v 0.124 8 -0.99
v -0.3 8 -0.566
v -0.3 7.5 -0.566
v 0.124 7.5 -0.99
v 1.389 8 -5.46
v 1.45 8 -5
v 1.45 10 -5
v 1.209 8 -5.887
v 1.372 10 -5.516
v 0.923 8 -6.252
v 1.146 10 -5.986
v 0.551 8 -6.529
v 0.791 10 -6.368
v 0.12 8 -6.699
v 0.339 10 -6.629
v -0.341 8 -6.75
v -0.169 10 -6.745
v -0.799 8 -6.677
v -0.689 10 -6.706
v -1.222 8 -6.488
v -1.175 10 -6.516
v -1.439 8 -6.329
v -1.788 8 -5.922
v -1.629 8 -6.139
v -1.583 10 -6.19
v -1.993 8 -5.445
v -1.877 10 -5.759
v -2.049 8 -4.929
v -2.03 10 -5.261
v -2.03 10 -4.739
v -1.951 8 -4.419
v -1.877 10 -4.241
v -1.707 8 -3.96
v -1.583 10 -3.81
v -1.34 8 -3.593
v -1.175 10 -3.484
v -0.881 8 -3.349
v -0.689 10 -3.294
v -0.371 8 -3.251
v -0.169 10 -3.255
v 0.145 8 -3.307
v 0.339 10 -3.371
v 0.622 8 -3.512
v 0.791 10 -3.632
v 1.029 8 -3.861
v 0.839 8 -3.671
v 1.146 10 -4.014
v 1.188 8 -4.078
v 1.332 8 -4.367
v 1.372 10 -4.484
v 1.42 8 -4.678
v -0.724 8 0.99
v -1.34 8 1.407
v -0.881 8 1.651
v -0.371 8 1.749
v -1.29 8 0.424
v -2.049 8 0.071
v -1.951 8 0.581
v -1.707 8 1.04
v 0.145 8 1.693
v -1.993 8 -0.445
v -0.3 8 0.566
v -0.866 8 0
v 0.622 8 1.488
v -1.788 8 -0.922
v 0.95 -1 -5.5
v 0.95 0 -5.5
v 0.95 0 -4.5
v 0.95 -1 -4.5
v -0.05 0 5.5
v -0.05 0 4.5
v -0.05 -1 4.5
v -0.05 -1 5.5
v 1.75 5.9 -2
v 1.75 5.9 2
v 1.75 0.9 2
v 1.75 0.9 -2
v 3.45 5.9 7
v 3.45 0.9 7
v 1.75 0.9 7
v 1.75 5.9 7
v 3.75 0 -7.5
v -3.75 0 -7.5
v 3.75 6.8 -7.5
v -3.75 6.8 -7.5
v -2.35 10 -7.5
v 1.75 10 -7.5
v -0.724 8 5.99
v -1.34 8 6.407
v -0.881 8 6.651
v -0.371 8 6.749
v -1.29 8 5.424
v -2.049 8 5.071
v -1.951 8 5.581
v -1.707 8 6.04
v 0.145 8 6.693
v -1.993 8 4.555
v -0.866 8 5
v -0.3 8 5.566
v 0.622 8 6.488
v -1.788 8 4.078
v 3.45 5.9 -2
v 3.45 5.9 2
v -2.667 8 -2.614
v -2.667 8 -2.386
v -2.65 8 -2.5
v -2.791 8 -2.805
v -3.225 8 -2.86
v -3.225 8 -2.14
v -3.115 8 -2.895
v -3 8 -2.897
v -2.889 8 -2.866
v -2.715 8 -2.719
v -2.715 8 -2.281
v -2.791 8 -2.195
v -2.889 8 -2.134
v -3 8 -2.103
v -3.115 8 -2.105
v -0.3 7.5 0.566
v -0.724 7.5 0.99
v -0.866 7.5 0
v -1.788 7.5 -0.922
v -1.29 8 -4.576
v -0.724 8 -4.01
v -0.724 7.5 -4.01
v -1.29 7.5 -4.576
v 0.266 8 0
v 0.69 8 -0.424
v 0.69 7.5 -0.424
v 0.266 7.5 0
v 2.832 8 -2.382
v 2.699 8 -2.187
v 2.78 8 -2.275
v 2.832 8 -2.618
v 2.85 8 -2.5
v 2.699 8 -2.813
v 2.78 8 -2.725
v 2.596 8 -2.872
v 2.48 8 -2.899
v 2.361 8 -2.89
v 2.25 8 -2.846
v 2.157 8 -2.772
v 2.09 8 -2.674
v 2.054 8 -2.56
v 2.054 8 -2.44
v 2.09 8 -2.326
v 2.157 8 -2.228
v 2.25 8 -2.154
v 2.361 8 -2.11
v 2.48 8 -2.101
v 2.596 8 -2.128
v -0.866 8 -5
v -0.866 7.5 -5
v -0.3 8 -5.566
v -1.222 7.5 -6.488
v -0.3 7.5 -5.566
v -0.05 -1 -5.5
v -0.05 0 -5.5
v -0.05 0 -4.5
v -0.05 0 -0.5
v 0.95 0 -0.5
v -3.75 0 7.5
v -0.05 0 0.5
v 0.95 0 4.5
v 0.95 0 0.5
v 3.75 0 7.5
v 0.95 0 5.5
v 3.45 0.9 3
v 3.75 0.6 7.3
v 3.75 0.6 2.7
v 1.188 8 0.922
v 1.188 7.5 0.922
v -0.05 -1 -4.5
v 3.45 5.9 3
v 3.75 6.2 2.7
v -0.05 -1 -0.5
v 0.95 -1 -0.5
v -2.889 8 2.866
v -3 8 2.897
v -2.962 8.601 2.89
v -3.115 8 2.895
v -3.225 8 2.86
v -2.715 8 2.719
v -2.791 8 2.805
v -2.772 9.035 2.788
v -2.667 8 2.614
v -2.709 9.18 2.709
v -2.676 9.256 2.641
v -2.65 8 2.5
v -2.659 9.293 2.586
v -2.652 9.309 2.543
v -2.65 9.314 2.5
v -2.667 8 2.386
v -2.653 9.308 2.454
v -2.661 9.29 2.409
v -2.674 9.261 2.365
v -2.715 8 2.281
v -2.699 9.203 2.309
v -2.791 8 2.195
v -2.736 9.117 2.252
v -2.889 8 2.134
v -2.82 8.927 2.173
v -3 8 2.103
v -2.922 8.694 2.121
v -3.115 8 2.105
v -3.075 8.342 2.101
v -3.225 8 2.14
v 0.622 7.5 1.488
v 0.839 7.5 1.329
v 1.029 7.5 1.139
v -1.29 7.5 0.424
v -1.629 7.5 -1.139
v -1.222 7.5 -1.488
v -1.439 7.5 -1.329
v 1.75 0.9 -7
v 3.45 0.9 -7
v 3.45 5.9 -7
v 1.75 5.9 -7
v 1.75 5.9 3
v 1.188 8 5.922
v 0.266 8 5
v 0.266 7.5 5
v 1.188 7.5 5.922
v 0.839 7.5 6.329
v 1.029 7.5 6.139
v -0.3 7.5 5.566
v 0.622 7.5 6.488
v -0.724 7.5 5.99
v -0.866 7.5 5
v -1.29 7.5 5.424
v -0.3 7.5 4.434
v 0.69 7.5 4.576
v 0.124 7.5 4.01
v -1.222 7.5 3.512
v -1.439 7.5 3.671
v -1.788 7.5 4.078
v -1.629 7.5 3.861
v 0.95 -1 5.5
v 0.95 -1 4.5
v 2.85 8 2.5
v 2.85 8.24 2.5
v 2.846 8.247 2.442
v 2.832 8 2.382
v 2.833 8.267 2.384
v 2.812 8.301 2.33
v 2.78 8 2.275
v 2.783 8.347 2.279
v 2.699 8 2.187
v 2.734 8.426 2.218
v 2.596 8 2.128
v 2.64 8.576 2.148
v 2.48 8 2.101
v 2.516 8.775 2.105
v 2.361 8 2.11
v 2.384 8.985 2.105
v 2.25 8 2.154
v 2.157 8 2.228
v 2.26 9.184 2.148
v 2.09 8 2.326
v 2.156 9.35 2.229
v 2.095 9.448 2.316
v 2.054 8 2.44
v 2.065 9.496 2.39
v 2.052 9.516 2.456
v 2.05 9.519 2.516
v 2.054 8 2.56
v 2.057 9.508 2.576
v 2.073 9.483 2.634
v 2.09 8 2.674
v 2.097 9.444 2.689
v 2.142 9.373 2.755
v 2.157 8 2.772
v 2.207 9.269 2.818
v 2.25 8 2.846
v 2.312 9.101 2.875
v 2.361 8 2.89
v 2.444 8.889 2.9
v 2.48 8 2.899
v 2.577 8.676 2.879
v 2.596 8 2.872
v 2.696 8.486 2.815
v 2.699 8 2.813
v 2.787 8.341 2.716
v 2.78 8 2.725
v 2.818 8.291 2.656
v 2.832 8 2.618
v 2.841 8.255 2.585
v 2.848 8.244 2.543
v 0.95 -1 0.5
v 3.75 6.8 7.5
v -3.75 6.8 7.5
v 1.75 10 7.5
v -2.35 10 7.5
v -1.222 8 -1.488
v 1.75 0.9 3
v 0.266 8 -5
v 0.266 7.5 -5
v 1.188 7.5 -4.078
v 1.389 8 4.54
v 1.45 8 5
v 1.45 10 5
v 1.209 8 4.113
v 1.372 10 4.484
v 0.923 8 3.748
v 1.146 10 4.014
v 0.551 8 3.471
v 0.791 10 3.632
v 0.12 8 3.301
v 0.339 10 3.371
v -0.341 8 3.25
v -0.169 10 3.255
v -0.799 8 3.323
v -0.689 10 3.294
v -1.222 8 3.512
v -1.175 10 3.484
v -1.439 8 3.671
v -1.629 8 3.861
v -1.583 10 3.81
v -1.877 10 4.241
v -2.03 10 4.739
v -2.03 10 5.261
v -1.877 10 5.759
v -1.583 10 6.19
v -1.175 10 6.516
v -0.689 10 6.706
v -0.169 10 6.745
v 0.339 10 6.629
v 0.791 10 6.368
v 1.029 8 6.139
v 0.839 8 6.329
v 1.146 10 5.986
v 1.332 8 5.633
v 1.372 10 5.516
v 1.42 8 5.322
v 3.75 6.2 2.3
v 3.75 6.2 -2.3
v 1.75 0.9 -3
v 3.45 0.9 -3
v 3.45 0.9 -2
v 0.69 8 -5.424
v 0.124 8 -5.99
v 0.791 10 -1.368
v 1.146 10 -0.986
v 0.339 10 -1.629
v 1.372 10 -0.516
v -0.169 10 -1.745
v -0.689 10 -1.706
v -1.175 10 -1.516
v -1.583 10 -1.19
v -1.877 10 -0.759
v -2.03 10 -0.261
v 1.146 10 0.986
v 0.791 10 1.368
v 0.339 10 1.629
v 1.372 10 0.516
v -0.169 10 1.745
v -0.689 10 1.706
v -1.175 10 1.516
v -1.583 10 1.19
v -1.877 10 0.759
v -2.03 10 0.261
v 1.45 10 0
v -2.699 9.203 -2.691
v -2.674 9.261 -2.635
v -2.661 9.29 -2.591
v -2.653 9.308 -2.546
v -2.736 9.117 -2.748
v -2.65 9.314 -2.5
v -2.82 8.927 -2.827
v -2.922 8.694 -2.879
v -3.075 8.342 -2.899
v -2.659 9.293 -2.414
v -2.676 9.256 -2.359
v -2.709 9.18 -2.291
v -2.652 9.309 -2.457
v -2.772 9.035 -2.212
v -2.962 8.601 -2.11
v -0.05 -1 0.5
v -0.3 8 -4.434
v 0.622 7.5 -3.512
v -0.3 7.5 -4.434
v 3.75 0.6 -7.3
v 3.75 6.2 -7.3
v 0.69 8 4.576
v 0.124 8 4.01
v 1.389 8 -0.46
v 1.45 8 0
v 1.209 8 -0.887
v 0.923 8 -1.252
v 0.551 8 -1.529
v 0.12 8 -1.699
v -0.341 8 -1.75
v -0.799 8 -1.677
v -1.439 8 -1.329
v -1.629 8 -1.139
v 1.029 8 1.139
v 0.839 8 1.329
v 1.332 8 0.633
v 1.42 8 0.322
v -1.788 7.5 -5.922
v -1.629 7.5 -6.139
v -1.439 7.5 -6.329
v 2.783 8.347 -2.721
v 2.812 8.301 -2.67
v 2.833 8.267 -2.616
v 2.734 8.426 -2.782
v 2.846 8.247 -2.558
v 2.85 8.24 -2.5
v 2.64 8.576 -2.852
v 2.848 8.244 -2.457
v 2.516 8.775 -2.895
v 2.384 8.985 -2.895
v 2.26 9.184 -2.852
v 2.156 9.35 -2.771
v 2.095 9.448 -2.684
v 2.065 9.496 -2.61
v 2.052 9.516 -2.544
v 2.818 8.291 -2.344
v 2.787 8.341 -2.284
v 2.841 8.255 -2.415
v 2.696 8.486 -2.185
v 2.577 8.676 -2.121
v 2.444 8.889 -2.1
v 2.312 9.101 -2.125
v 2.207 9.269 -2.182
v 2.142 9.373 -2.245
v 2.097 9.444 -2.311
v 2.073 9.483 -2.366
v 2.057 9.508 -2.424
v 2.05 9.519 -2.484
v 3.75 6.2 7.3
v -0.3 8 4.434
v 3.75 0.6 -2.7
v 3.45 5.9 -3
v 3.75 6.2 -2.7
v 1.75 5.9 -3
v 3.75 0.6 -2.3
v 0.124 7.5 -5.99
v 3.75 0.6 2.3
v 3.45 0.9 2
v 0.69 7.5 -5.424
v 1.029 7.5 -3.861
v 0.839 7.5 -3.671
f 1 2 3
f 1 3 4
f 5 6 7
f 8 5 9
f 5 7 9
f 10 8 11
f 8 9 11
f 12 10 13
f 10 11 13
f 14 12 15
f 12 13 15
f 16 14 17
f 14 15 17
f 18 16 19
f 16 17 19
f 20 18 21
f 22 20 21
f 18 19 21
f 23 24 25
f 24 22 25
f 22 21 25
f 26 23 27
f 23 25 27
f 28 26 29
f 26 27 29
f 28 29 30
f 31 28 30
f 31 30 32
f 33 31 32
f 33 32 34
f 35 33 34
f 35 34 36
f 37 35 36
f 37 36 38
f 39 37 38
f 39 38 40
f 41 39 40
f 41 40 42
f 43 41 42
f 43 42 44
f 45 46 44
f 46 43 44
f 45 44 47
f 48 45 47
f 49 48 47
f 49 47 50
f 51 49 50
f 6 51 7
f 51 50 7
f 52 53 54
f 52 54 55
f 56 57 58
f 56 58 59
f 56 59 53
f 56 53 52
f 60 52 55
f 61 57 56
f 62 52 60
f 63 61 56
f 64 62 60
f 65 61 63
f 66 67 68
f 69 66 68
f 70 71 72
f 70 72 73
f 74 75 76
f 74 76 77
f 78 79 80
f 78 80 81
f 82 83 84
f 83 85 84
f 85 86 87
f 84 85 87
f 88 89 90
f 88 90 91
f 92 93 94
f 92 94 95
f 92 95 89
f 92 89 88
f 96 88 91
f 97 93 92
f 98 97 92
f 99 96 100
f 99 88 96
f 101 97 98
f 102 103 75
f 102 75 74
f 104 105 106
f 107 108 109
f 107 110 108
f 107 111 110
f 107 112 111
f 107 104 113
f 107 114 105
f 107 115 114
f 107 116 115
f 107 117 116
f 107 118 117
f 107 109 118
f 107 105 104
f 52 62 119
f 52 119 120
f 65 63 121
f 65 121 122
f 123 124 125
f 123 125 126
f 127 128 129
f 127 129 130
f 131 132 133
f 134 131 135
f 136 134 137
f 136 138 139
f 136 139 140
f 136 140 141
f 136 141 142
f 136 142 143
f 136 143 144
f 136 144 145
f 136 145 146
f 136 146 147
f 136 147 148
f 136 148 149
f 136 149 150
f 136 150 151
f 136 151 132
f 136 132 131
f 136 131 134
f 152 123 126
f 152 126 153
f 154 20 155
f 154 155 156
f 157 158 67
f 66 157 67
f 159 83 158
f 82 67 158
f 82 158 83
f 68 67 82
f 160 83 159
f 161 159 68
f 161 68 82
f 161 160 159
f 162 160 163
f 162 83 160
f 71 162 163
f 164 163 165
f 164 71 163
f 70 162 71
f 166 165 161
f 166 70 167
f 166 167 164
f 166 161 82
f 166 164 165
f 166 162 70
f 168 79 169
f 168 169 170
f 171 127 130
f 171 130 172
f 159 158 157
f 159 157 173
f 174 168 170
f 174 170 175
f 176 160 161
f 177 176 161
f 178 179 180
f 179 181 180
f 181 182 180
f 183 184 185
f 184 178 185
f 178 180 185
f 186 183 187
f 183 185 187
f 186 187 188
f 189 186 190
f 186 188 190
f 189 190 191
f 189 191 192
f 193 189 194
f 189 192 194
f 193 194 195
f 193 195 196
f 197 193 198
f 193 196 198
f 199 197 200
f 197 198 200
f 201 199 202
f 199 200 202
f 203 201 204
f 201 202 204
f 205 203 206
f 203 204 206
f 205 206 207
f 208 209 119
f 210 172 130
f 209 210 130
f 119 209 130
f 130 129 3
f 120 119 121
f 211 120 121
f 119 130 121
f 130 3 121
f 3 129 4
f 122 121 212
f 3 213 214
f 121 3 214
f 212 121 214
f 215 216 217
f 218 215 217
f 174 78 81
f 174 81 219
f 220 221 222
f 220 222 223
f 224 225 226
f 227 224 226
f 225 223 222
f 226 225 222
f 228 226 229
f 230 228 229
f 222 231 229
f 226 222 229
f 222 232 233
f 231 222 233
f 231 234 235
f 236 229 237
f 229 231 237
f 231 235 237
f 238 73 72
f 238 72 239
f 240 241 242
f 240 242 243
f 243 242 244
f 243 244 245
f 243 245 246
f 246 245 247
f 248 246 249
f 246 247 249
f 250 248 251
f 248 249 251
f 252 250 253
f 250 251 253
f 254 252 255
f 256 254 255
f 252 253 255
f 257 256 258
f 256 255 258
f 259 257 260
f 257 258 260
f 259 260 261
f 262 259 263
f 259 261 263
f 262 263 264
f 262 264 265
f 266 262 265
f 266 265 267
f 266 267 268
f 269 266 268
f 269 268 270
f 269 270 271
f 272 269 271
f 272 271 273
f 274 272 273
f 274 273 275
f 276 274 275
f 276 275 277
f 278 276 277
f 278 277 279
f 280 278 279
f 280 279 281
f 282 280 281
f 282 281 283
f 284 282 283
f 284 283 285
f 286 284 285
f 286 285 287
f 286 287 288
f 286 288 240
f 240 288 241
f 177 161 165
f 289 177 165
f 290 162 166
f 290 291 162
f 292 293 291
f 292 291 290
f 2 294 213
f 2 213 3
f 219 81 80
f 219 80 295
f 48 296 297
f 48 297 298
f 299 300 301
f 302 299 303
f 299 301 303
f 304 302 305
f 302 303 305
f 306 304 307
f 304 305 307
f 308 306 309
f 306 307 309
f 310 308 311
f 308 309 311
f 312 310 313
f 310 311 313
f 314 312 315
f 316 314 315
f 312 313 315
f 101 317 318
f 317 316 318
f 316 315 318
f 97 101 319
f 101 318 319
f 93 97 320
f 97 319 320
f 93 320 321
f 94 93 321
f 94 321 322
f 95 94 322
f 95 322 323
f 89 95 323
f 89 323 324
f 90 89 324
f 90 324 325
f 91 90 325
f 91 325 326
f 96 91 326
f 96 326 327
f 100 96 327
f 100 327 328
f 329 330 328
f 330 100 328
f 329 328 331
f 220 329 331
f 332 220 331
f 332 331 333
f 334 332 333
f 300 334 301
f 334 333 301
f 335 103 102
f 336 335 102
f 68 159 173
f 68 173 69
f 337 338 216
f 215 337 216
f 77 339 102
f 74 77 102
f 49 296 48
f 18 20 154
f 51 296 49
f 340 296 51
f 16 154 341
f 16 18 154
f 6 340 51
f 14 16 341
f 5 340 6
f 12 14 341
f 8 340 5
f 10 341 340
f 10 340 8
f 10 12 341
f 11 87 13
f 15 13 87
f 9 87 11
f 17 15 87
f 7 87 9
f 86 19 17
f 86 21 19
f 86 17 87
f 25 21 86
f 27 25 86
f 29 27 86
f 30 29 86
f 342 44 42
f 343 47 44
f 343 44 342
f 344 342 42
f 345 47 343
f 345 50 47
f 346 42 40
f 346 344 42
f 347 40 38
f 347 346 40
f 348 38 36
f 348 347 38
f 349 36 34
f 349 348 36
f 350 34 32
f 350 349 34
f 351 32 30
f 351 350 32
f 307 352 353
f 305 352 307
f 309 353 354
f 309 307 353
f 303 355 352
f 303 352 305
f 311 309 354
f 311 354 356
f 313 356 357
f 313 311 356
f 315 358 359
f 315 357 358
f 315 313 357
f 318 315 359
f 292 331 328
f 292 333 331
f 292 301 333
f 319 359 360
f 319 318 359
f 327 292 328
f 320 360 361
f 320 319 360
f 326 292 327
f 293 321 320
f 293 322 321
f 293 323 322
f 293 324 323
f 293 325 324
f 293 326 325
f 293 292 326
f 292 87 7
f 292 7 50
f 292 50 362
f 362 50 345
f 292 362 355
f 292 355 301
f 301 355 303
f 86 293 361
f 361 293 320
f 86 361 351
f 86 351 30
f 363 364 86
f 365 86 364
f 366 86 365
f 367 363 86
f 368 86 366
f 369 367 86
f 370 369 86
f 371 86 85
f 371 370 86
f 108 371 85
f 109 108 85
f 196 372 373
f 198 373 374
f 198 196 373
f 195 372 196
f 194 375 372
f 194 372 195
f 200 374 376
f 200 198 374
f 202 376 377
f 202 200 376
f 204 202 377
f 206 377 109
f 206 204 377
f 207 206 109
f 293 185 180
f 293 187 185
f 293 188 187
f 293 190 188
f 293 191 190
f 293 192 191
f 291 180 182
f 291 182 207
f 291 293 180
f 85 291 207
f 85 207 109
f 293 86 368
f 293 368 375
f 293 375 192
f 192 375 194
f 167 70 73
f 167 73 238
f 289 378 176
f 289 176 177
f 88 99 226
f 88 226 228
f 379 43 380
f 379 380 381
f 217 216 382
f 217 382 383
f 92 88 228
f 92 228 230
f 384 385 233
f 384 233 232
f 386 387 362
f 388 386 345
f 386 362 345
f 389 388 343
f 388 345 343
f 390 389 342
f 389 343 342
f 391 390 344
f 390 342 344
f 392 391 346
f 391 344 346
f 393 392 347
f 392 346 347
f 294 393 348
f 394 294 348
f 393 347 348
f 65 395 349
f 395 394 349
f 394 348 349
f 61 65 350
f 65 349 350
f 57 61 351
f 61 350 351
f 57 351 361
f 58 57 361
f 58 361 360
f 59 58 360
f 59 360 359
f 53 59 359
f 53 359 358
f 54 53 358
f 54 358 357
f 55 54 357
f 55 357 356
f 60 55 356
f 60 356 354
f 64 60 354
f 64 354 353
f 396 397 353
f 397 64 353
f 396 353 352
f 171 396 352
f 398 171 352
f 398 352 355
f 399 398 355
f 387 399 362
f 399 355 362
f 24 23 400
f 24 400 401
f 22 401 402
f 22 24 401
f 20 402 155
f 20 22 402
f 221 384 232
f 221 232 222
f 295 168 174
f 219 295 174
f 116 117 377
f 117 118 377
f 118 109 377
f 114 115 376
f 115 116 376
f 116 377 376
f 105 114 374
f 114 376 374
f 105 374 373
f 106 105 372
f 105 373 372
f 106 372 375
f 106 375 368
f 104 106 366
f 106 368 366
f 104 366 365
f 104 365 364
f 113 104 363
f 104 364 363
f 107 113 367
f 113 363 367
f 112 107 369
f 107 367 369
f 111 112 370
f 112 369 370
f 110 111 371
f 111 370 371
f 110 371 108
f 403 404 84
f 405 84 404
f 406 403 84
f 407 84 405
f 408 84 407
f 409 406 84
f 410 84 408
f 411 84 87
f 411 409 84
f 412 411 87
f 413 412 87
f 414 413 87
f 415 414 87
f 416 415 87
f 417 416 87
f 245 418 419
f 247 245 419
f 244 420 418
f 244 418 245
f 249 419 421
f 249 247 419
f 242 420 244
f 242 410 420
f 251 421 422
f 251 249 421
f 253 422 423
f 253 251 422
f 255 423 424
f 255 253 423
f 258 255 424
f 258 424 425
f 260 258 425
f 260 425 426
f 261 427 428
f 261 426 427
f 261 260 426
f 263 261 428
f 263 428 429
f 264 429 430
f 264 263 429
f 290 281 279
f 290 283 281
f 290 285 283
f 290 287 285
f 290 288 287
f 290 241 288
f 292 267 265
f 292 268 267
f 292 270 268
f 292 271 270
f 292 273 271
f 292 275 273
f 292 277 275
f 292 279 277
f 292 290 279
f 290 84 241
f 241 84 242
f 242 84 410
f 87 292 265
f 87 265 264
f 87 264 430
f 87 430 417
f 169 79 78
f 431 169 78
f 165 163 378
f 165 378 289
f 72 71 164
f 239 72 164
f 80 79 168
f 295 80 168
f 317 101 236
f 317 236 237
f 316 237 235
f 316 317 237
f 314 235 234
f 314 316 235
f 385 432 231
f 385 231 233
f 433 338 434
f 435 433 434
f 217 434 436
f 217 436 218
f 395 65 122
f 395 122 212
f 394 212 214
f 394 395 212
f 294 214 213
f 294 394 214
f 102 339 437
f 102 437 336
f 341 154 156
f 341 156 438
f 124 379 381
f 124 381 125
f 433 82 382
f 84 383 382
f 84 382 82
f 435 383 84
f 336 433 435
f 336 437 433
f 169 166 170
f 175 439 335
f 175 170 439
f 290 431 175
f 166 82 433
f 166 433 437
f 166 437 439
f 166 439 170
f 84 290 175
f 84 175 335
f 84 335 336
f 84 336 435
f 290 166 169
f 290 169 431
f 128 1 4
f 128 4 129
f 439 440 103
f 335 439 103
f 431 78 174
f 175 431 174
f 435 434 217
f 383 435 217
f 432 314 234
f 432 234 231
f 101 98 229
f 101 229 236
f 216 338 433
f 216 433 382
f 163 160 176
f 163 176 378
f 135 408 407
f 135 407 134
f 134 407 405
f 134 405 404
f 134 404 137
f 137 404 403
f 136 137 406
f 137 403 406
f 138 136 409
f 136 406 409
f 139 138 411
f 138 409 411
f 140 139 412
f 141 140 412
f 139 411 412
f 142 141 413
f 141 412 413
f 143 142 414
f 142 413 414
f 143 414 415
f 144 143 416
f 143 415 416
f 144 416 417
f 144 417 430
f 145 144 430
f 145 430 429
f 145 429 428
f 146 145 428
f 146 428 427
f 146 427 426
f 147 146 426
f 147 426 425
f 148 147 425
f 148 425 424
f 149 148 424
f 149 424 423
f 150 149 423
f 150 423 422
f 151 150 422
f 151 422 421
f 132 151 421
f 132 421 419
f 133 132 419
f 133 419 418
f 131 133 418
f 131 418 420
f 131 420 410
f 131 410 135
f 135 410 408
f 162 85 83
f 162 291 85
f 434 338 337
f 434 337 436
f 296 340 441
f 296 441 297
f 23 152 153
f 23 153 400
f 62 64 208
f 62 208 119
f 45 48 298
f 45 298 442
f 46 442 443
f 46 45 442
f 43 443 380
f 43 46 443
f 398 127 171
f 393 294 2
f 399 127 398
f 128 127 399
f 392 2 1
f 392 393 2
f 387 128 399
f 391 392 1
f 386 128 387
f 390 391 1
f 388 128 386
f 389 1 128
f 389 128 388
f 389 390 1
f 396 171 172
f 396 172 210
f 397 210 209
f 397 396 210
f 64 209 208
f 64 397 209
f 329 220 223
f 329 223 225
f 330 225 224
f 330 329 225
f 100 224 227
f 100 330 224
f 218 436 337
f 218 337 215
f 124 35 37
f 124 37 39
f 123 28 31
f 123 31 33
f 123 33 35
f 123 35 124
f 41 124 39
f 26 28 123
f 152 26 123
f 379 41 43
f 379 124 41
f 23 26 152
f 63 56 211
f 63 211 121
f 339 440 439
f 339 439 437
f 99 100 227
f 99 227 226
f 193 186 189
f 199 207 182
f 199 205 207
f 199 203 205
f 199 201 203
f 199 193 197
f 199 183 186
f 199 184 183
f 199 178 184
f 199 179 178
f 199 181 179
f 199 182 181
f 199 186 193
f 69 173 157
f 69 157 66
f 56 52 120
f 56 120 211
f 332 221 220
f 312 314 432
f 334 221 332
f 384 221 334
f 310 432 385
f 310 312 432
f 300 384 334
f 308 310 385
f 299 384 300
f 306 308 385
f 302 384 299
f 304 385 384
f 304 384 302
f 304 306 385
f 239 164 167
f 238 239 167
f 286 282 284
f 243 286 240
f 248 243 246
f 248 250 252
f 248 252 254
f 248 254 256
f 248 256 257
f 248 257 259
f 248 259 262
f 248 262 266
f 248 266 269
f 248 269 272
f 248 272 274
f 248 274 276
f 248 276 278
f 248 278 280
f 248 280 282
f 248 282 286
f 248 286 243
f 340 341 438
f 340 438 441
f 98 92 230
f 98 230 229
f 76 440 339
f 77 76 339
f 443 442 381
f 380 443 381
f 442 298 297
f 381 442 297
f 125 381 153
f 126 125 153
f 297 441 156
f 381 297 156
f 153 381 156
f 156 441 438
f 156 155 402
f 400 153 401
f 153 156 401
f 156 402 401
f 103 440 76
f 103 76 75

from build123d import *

# Parameters (mm, degrees)
BOSS_EXTRUDE1_DEPTH = 7.5
SKETCH2_W           = 1
SKETCH2_H           = 1
BOSS_EXTRUDE2_DEPTH = 1
SKETCH3_W           = 4
SKETCH3_H           = 5
CUT_EXTRUDE1_DEPTH  = 2
SKETCH4_R           = 1.75
SKETCH4_R_2         = 0.4
CUT_EXTRUDE2_DEPTH  = 2
CUT_EXTRUDE3_DEPTH  = 0.5
CHAMFER1_SIZE       = 0.3


with BuildPart() as part:
    # Sketch1 → Boss-Extrude1 (new body, symmetric)
    with BuildSketch(Plane.XY):
        Polygon((-3.75, 0), (3.75, 0), (3.75, 6.8), (1.75, 10), (-2.35, 10), (-3.75, 6.8), align=None)
    extrude(amount=BOSS_EXTRUDE1_DEPTH, both=True)

    # Sketch2 → Boss-Extrude2 (add)
    with BuildSketch(Plane.XZ):
        with Locations((0.45, 5)):
            Rectangle(SKETCH2_W, SKETCH2_H)
        with Locations((0.45, 0)):
            Rectangle(SKETCH2_W, SKETCH2_H)
        with Locations((0.45, -5)):
            Rectangle(SKETCH2_W, SKETCH2_H)
    extrude(amount=BOSS_EXTRUDE2_DEPTH)

    # Sketch3 → Cut-Extrude1 (cut)
    with BuildSketch(Plane(origin=(3.75, 0, 0), x_dir=(0, 0, -1), z_dir=(1, 0, 0))):
        with Locations((-5, 3.4)):
            Rectangle(SKETCH3_W, SKETCH3_H)
        with Locations((0, 3.4)):
            Rectangle(SKETCH3_W, SKETCH3_H)
        with Locations((5, 3.4)):
            Rectangle(SKETCH3_W, SKETCH3_H)
    extrude(amount=-CUT_EXTRUDE1_DEPTH, mode=Mode.SUBTRACT)

    # Sketch4 → Cut-Extrude2 (cut)
    with BuildSketch(Plane(origin=(0, 10, 0), x_dir=(1, 0, 0), z_dir=(0, 1, 0))):
        with Locations((-0.3, 5)):
            Circle(SKETCH4_R)
        with Locations((-0.3, 0)):
            Circle(SKETCH4_R)
        with Locations((-0.3, -5)):
            Circle(SKETCH4_R)
        with Locations((2.45, 2.5)):
            Circle(SKETCH4_R_2)
        with Locations((2.45, -2.5)):
            Circle(SKETCH4_R_2)
        with Locations((-3.05, 2.5)):
            Circle(SKETCH4_R_2)
        with Locations((-3.05, -2.5)):
            Circle(SKETCH4_R_2)
    extrude(amount=-CUT_EXTRUDE2_DEPTH, mode=Mode.SUBTRACT)

    # Sketch5 → Cut-Extrude3 (cut)
    with BuildSketch(Plane(origin=(0, 8, 0), x_dir=(1, 0, 0), z_dir=(0, 1, 0))):
        with BuildLine():
            Line((-1.221836, 1.487521), (-0.3, 0.565685))
            Line((-0.3, 0.565685), (0.124264, 0.989949))
            Line((0.124264, 0.989949), (0.689949, 0.424264))
            Line((0.689949, 0.424264), (0.265685, 0))
            Line((0.265685, 0), (1.187521, -0.921836))
            ThreePointArc((1.187521, -0.921836), (0.937437, -1.237437), (0.621836, -1.487521))
            Line((0.621836, -1.487521), (-0.3, -0.565685))
            Line((-0.3, -0.565685), (-0.724264, -0.989949))
            Line((-0.724264, -0.989949), (-1.289949, -0.424264))
            Line((-1.289949, -0.424264), (-0.865685, 0))
            Line((-0.865685, 0), (-1.787521, 0.921836))
            ThreePointArc((-1.787521, 0.921836), (-1.537437, 1.237437), (-1.221836, 1.487521))
        make_face()
        with BuildLine():
            Line((-1.221836, 6.487521), (-0.3, 5.565685))
            Line((-0.3, 5.565685), (0.124264, 5.989949))
            Line((0.124264, 5.989949), (0.689949, 5.424264))
            Line((0.689949, 5.424264), (0.265685, 5))
            Line((0.265685, 5), (1.187521, 4.078164))
            ThreePointArc((1.187521, 4.078164), (0.937437, 3.762563), (0.621836, 3.512479))
            Line((0.621836, 3.512479), (-0.3, 4.434315))
            Line((-0.3, 4.434315), (-0.724264, 4.010051))
            Line((-0.724264, 4.010051), (-1.289949, 4.575736))
            Line((-1.289949, 4.575736), (-0.865685, 5))
            Line((-0.865685, 5), (-1.787521, 5.921836))
            ThreePointArc((-1.787521, 5.921836), (-1.537437, 6.237437), (-1.221836, 6.487521))
        make_face()
        with BuildLine():
            Line((-1.221836, -3.512479), (-0.3, -4.434315))
            Line((-0.3, -4.434315), (0.124264, -4.010051))
            Line((0.124264, -4.010051), (0.689949, -4.575736))
            Line((0.689949, -4.575736), (0.265685, -5))
            Line((0.265685, -5), (1.187521, -5.921836))
            ThreePointArc((1.187521, -5.921836), (0.937437, -6.237437), (0.621836, -6.487521))
            Line((0.621836, -6.487521), (-0.3, -5.565685))
            Line((-0.3, -5.565685), (-0.724264, -5.989949))
            Line((-0.724264, -5.989949), (-1.289949, -5.424264))
            Line((-1.289949, -5.424264), (-0.865685, -5))
            Line((-0.865685, -5), (-1.787521, -4.078164))
            ThreePointArc((-1.787521, -4.078164), (-1.537437, -3.762563), (-1.221836, -3.512479))
        make_face()
    extrude(amount=-CUT_EXTRUDE3_DEPTH, mode=Mode.SUBTRACT)

    # Chamfer1
    chamfer1_edges = [part.edges().sort_by_distance(p)[0] for p in [
        (3.75, 3.4, 7),
        (3.75, 0.9, 5),
        (3.75, 3.4, 3),
        (3.75, 5.9, 5),
        (3.75, 3.4, 2),
        (3.75, 0.9, 0),
        (3.75, 3.4, -2),
        (3.75, 5.9, 0),
        (3.75, 3.4, -3),
        (3.75, 0.9, -5),
        (3.75, 3.4, -7),
        (3.75, 5.9, -5),
    ]]
    chamfer(chamfer1_edges, length=CHAMFER1_SIZE)


solid = part.part
